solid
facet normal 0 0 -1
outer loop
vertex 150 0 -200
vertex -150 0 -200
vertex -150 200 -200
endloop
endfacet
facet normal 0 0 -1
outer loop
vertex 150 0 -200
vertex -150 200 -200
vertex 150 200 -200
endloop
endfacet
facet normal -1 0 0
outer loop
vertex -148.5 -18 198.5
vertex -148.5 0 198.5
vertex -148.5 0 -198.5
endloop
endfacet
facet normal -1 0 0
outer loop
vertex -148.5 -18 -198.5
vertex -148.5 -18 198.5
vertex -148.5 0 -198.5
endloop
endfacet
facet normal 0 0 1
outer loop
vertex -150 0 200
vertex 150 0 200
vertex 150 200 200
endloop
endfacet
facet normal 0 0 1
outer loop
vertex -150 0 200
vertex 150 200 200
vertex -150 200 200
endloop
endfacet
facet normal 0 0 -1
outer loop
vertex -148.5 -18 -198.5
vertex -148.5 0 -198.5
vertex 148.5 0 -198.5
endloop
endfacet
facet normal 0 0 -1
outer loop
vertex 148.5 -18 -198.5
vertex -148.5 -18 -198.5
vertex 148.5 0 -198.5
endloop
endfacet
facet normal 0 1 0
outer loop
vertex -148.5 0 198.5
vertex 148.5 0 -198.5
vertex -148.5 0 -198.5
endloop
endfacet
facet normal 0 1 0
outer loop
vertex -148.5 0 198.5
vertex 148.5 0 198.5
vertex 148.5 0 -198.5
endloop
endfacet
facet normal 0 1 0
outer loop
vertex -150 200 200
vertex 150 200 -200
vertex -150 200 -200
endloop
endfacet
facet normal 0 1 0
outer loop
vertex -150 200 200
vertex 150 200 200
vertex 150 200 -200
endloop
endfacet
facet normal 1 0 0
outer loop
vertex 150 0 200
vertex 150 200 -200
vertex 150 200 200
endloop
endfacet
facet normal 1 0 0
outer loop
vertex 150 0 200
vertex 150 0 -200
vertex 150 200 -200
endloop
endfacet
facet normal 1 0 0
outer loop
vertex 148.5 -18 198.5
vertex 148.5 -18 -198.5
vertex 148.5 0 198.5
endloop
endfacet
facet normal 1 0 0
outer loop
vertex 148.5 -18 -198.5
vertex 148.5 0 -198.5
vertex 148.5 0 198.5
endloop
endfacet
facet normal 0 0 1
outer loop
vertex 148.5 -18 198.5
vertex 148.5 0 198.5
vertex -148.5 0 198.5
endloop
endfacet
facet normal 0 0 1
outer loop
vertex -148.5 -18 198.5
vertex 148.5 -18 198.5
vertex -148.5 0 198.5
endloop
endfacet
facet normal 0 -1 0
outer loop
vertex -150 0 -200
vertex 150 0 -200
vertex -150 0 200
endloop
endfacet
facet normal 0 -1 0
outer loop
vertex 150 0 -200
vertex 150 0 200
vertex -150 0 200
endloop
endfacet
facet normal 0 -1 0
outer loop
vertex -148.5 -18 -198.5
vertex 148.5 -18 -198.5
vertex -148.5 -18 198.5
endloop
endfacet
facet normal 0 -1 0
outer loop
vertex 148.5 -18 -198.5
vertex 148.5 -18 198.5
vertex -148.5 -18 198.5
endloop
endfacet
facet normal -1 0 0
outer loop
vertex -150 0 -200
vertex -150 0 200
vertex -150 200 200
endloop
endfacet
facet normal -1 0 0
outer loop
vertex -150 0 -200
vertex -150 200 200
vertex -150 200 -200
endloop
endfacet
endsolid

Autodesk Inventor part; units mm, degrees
ref_plane "YZ Plane" through (0, 0, 0) normal (1, 0, 0) x (0, 1, 0)
ref_plane "XZ Plane" through (0, 0, 0) normal (0, 1, 0) x (-1, 0, 0)
ref_plane "XY Plane" through (0, 0, 0) normal (0, 0, 1) x (1, 0, 0)
sketch "Sketch2" plane through (0, 0, 0) normal (0, 1, 0) x (-1, 0, 0)
  line L0 (150, -200) -> (-150, -200)
  line L1 (-150, -200) -> (-150, 200)
  line L2 (-150, 200) -> (150, 200)
  line L3 (150, 200) -> (150, -200)
  line L4 (150, -200) -> (-150, 200) construction
  line L5 (-150, -200) -> (150, 200) construction
  point P0 (0, 0)
  dimension "Width" = 300
  dimension "Height" = 400
sketch "Sketch1" plane through (0, 0, 0) normal (0, 1, 0) x (-1, 0, 0)
  line L0 (148.5, -198.5) -> (-148.5, -198.5)
  line L1 (-148.5, -198.5) -> (-148.5, 198.5)
  line L2 (-148.5, 198.5) -> (148.5, 198.5)
  line L3 (148.5, 198.5) -> (148.5, -198.5)
  line L4 (-150, 200) -> (150, 200) construction
  line L5 (150, 200) -> (150, -200) construction
  line L6 (150, -200) -> (-150, -200) construction
  line L7 (-150, -200) -> (-150, 200) construction
  point P0 (0, 0)
  dimension "Off_From_Top" = 1.5
  dimension "Off_From_Left" = 1.5
  dimension "Off_From_Bottom" = 1.5
  dimension "Off_From_Right" = 1.5
extrude "Extrusion1" add sketch "Sketch1" against normal blind 18
extrude "Extrusion2" add sketch "Sketch2" along normal blind 200 separate body
equation "\"Total_Offset\" = 0.001"
equation "\"Hinge_Gap\" = 0"
equation "\"Inset_Dist\" = 0"
properties part number "Laminated Board Skeleton"
